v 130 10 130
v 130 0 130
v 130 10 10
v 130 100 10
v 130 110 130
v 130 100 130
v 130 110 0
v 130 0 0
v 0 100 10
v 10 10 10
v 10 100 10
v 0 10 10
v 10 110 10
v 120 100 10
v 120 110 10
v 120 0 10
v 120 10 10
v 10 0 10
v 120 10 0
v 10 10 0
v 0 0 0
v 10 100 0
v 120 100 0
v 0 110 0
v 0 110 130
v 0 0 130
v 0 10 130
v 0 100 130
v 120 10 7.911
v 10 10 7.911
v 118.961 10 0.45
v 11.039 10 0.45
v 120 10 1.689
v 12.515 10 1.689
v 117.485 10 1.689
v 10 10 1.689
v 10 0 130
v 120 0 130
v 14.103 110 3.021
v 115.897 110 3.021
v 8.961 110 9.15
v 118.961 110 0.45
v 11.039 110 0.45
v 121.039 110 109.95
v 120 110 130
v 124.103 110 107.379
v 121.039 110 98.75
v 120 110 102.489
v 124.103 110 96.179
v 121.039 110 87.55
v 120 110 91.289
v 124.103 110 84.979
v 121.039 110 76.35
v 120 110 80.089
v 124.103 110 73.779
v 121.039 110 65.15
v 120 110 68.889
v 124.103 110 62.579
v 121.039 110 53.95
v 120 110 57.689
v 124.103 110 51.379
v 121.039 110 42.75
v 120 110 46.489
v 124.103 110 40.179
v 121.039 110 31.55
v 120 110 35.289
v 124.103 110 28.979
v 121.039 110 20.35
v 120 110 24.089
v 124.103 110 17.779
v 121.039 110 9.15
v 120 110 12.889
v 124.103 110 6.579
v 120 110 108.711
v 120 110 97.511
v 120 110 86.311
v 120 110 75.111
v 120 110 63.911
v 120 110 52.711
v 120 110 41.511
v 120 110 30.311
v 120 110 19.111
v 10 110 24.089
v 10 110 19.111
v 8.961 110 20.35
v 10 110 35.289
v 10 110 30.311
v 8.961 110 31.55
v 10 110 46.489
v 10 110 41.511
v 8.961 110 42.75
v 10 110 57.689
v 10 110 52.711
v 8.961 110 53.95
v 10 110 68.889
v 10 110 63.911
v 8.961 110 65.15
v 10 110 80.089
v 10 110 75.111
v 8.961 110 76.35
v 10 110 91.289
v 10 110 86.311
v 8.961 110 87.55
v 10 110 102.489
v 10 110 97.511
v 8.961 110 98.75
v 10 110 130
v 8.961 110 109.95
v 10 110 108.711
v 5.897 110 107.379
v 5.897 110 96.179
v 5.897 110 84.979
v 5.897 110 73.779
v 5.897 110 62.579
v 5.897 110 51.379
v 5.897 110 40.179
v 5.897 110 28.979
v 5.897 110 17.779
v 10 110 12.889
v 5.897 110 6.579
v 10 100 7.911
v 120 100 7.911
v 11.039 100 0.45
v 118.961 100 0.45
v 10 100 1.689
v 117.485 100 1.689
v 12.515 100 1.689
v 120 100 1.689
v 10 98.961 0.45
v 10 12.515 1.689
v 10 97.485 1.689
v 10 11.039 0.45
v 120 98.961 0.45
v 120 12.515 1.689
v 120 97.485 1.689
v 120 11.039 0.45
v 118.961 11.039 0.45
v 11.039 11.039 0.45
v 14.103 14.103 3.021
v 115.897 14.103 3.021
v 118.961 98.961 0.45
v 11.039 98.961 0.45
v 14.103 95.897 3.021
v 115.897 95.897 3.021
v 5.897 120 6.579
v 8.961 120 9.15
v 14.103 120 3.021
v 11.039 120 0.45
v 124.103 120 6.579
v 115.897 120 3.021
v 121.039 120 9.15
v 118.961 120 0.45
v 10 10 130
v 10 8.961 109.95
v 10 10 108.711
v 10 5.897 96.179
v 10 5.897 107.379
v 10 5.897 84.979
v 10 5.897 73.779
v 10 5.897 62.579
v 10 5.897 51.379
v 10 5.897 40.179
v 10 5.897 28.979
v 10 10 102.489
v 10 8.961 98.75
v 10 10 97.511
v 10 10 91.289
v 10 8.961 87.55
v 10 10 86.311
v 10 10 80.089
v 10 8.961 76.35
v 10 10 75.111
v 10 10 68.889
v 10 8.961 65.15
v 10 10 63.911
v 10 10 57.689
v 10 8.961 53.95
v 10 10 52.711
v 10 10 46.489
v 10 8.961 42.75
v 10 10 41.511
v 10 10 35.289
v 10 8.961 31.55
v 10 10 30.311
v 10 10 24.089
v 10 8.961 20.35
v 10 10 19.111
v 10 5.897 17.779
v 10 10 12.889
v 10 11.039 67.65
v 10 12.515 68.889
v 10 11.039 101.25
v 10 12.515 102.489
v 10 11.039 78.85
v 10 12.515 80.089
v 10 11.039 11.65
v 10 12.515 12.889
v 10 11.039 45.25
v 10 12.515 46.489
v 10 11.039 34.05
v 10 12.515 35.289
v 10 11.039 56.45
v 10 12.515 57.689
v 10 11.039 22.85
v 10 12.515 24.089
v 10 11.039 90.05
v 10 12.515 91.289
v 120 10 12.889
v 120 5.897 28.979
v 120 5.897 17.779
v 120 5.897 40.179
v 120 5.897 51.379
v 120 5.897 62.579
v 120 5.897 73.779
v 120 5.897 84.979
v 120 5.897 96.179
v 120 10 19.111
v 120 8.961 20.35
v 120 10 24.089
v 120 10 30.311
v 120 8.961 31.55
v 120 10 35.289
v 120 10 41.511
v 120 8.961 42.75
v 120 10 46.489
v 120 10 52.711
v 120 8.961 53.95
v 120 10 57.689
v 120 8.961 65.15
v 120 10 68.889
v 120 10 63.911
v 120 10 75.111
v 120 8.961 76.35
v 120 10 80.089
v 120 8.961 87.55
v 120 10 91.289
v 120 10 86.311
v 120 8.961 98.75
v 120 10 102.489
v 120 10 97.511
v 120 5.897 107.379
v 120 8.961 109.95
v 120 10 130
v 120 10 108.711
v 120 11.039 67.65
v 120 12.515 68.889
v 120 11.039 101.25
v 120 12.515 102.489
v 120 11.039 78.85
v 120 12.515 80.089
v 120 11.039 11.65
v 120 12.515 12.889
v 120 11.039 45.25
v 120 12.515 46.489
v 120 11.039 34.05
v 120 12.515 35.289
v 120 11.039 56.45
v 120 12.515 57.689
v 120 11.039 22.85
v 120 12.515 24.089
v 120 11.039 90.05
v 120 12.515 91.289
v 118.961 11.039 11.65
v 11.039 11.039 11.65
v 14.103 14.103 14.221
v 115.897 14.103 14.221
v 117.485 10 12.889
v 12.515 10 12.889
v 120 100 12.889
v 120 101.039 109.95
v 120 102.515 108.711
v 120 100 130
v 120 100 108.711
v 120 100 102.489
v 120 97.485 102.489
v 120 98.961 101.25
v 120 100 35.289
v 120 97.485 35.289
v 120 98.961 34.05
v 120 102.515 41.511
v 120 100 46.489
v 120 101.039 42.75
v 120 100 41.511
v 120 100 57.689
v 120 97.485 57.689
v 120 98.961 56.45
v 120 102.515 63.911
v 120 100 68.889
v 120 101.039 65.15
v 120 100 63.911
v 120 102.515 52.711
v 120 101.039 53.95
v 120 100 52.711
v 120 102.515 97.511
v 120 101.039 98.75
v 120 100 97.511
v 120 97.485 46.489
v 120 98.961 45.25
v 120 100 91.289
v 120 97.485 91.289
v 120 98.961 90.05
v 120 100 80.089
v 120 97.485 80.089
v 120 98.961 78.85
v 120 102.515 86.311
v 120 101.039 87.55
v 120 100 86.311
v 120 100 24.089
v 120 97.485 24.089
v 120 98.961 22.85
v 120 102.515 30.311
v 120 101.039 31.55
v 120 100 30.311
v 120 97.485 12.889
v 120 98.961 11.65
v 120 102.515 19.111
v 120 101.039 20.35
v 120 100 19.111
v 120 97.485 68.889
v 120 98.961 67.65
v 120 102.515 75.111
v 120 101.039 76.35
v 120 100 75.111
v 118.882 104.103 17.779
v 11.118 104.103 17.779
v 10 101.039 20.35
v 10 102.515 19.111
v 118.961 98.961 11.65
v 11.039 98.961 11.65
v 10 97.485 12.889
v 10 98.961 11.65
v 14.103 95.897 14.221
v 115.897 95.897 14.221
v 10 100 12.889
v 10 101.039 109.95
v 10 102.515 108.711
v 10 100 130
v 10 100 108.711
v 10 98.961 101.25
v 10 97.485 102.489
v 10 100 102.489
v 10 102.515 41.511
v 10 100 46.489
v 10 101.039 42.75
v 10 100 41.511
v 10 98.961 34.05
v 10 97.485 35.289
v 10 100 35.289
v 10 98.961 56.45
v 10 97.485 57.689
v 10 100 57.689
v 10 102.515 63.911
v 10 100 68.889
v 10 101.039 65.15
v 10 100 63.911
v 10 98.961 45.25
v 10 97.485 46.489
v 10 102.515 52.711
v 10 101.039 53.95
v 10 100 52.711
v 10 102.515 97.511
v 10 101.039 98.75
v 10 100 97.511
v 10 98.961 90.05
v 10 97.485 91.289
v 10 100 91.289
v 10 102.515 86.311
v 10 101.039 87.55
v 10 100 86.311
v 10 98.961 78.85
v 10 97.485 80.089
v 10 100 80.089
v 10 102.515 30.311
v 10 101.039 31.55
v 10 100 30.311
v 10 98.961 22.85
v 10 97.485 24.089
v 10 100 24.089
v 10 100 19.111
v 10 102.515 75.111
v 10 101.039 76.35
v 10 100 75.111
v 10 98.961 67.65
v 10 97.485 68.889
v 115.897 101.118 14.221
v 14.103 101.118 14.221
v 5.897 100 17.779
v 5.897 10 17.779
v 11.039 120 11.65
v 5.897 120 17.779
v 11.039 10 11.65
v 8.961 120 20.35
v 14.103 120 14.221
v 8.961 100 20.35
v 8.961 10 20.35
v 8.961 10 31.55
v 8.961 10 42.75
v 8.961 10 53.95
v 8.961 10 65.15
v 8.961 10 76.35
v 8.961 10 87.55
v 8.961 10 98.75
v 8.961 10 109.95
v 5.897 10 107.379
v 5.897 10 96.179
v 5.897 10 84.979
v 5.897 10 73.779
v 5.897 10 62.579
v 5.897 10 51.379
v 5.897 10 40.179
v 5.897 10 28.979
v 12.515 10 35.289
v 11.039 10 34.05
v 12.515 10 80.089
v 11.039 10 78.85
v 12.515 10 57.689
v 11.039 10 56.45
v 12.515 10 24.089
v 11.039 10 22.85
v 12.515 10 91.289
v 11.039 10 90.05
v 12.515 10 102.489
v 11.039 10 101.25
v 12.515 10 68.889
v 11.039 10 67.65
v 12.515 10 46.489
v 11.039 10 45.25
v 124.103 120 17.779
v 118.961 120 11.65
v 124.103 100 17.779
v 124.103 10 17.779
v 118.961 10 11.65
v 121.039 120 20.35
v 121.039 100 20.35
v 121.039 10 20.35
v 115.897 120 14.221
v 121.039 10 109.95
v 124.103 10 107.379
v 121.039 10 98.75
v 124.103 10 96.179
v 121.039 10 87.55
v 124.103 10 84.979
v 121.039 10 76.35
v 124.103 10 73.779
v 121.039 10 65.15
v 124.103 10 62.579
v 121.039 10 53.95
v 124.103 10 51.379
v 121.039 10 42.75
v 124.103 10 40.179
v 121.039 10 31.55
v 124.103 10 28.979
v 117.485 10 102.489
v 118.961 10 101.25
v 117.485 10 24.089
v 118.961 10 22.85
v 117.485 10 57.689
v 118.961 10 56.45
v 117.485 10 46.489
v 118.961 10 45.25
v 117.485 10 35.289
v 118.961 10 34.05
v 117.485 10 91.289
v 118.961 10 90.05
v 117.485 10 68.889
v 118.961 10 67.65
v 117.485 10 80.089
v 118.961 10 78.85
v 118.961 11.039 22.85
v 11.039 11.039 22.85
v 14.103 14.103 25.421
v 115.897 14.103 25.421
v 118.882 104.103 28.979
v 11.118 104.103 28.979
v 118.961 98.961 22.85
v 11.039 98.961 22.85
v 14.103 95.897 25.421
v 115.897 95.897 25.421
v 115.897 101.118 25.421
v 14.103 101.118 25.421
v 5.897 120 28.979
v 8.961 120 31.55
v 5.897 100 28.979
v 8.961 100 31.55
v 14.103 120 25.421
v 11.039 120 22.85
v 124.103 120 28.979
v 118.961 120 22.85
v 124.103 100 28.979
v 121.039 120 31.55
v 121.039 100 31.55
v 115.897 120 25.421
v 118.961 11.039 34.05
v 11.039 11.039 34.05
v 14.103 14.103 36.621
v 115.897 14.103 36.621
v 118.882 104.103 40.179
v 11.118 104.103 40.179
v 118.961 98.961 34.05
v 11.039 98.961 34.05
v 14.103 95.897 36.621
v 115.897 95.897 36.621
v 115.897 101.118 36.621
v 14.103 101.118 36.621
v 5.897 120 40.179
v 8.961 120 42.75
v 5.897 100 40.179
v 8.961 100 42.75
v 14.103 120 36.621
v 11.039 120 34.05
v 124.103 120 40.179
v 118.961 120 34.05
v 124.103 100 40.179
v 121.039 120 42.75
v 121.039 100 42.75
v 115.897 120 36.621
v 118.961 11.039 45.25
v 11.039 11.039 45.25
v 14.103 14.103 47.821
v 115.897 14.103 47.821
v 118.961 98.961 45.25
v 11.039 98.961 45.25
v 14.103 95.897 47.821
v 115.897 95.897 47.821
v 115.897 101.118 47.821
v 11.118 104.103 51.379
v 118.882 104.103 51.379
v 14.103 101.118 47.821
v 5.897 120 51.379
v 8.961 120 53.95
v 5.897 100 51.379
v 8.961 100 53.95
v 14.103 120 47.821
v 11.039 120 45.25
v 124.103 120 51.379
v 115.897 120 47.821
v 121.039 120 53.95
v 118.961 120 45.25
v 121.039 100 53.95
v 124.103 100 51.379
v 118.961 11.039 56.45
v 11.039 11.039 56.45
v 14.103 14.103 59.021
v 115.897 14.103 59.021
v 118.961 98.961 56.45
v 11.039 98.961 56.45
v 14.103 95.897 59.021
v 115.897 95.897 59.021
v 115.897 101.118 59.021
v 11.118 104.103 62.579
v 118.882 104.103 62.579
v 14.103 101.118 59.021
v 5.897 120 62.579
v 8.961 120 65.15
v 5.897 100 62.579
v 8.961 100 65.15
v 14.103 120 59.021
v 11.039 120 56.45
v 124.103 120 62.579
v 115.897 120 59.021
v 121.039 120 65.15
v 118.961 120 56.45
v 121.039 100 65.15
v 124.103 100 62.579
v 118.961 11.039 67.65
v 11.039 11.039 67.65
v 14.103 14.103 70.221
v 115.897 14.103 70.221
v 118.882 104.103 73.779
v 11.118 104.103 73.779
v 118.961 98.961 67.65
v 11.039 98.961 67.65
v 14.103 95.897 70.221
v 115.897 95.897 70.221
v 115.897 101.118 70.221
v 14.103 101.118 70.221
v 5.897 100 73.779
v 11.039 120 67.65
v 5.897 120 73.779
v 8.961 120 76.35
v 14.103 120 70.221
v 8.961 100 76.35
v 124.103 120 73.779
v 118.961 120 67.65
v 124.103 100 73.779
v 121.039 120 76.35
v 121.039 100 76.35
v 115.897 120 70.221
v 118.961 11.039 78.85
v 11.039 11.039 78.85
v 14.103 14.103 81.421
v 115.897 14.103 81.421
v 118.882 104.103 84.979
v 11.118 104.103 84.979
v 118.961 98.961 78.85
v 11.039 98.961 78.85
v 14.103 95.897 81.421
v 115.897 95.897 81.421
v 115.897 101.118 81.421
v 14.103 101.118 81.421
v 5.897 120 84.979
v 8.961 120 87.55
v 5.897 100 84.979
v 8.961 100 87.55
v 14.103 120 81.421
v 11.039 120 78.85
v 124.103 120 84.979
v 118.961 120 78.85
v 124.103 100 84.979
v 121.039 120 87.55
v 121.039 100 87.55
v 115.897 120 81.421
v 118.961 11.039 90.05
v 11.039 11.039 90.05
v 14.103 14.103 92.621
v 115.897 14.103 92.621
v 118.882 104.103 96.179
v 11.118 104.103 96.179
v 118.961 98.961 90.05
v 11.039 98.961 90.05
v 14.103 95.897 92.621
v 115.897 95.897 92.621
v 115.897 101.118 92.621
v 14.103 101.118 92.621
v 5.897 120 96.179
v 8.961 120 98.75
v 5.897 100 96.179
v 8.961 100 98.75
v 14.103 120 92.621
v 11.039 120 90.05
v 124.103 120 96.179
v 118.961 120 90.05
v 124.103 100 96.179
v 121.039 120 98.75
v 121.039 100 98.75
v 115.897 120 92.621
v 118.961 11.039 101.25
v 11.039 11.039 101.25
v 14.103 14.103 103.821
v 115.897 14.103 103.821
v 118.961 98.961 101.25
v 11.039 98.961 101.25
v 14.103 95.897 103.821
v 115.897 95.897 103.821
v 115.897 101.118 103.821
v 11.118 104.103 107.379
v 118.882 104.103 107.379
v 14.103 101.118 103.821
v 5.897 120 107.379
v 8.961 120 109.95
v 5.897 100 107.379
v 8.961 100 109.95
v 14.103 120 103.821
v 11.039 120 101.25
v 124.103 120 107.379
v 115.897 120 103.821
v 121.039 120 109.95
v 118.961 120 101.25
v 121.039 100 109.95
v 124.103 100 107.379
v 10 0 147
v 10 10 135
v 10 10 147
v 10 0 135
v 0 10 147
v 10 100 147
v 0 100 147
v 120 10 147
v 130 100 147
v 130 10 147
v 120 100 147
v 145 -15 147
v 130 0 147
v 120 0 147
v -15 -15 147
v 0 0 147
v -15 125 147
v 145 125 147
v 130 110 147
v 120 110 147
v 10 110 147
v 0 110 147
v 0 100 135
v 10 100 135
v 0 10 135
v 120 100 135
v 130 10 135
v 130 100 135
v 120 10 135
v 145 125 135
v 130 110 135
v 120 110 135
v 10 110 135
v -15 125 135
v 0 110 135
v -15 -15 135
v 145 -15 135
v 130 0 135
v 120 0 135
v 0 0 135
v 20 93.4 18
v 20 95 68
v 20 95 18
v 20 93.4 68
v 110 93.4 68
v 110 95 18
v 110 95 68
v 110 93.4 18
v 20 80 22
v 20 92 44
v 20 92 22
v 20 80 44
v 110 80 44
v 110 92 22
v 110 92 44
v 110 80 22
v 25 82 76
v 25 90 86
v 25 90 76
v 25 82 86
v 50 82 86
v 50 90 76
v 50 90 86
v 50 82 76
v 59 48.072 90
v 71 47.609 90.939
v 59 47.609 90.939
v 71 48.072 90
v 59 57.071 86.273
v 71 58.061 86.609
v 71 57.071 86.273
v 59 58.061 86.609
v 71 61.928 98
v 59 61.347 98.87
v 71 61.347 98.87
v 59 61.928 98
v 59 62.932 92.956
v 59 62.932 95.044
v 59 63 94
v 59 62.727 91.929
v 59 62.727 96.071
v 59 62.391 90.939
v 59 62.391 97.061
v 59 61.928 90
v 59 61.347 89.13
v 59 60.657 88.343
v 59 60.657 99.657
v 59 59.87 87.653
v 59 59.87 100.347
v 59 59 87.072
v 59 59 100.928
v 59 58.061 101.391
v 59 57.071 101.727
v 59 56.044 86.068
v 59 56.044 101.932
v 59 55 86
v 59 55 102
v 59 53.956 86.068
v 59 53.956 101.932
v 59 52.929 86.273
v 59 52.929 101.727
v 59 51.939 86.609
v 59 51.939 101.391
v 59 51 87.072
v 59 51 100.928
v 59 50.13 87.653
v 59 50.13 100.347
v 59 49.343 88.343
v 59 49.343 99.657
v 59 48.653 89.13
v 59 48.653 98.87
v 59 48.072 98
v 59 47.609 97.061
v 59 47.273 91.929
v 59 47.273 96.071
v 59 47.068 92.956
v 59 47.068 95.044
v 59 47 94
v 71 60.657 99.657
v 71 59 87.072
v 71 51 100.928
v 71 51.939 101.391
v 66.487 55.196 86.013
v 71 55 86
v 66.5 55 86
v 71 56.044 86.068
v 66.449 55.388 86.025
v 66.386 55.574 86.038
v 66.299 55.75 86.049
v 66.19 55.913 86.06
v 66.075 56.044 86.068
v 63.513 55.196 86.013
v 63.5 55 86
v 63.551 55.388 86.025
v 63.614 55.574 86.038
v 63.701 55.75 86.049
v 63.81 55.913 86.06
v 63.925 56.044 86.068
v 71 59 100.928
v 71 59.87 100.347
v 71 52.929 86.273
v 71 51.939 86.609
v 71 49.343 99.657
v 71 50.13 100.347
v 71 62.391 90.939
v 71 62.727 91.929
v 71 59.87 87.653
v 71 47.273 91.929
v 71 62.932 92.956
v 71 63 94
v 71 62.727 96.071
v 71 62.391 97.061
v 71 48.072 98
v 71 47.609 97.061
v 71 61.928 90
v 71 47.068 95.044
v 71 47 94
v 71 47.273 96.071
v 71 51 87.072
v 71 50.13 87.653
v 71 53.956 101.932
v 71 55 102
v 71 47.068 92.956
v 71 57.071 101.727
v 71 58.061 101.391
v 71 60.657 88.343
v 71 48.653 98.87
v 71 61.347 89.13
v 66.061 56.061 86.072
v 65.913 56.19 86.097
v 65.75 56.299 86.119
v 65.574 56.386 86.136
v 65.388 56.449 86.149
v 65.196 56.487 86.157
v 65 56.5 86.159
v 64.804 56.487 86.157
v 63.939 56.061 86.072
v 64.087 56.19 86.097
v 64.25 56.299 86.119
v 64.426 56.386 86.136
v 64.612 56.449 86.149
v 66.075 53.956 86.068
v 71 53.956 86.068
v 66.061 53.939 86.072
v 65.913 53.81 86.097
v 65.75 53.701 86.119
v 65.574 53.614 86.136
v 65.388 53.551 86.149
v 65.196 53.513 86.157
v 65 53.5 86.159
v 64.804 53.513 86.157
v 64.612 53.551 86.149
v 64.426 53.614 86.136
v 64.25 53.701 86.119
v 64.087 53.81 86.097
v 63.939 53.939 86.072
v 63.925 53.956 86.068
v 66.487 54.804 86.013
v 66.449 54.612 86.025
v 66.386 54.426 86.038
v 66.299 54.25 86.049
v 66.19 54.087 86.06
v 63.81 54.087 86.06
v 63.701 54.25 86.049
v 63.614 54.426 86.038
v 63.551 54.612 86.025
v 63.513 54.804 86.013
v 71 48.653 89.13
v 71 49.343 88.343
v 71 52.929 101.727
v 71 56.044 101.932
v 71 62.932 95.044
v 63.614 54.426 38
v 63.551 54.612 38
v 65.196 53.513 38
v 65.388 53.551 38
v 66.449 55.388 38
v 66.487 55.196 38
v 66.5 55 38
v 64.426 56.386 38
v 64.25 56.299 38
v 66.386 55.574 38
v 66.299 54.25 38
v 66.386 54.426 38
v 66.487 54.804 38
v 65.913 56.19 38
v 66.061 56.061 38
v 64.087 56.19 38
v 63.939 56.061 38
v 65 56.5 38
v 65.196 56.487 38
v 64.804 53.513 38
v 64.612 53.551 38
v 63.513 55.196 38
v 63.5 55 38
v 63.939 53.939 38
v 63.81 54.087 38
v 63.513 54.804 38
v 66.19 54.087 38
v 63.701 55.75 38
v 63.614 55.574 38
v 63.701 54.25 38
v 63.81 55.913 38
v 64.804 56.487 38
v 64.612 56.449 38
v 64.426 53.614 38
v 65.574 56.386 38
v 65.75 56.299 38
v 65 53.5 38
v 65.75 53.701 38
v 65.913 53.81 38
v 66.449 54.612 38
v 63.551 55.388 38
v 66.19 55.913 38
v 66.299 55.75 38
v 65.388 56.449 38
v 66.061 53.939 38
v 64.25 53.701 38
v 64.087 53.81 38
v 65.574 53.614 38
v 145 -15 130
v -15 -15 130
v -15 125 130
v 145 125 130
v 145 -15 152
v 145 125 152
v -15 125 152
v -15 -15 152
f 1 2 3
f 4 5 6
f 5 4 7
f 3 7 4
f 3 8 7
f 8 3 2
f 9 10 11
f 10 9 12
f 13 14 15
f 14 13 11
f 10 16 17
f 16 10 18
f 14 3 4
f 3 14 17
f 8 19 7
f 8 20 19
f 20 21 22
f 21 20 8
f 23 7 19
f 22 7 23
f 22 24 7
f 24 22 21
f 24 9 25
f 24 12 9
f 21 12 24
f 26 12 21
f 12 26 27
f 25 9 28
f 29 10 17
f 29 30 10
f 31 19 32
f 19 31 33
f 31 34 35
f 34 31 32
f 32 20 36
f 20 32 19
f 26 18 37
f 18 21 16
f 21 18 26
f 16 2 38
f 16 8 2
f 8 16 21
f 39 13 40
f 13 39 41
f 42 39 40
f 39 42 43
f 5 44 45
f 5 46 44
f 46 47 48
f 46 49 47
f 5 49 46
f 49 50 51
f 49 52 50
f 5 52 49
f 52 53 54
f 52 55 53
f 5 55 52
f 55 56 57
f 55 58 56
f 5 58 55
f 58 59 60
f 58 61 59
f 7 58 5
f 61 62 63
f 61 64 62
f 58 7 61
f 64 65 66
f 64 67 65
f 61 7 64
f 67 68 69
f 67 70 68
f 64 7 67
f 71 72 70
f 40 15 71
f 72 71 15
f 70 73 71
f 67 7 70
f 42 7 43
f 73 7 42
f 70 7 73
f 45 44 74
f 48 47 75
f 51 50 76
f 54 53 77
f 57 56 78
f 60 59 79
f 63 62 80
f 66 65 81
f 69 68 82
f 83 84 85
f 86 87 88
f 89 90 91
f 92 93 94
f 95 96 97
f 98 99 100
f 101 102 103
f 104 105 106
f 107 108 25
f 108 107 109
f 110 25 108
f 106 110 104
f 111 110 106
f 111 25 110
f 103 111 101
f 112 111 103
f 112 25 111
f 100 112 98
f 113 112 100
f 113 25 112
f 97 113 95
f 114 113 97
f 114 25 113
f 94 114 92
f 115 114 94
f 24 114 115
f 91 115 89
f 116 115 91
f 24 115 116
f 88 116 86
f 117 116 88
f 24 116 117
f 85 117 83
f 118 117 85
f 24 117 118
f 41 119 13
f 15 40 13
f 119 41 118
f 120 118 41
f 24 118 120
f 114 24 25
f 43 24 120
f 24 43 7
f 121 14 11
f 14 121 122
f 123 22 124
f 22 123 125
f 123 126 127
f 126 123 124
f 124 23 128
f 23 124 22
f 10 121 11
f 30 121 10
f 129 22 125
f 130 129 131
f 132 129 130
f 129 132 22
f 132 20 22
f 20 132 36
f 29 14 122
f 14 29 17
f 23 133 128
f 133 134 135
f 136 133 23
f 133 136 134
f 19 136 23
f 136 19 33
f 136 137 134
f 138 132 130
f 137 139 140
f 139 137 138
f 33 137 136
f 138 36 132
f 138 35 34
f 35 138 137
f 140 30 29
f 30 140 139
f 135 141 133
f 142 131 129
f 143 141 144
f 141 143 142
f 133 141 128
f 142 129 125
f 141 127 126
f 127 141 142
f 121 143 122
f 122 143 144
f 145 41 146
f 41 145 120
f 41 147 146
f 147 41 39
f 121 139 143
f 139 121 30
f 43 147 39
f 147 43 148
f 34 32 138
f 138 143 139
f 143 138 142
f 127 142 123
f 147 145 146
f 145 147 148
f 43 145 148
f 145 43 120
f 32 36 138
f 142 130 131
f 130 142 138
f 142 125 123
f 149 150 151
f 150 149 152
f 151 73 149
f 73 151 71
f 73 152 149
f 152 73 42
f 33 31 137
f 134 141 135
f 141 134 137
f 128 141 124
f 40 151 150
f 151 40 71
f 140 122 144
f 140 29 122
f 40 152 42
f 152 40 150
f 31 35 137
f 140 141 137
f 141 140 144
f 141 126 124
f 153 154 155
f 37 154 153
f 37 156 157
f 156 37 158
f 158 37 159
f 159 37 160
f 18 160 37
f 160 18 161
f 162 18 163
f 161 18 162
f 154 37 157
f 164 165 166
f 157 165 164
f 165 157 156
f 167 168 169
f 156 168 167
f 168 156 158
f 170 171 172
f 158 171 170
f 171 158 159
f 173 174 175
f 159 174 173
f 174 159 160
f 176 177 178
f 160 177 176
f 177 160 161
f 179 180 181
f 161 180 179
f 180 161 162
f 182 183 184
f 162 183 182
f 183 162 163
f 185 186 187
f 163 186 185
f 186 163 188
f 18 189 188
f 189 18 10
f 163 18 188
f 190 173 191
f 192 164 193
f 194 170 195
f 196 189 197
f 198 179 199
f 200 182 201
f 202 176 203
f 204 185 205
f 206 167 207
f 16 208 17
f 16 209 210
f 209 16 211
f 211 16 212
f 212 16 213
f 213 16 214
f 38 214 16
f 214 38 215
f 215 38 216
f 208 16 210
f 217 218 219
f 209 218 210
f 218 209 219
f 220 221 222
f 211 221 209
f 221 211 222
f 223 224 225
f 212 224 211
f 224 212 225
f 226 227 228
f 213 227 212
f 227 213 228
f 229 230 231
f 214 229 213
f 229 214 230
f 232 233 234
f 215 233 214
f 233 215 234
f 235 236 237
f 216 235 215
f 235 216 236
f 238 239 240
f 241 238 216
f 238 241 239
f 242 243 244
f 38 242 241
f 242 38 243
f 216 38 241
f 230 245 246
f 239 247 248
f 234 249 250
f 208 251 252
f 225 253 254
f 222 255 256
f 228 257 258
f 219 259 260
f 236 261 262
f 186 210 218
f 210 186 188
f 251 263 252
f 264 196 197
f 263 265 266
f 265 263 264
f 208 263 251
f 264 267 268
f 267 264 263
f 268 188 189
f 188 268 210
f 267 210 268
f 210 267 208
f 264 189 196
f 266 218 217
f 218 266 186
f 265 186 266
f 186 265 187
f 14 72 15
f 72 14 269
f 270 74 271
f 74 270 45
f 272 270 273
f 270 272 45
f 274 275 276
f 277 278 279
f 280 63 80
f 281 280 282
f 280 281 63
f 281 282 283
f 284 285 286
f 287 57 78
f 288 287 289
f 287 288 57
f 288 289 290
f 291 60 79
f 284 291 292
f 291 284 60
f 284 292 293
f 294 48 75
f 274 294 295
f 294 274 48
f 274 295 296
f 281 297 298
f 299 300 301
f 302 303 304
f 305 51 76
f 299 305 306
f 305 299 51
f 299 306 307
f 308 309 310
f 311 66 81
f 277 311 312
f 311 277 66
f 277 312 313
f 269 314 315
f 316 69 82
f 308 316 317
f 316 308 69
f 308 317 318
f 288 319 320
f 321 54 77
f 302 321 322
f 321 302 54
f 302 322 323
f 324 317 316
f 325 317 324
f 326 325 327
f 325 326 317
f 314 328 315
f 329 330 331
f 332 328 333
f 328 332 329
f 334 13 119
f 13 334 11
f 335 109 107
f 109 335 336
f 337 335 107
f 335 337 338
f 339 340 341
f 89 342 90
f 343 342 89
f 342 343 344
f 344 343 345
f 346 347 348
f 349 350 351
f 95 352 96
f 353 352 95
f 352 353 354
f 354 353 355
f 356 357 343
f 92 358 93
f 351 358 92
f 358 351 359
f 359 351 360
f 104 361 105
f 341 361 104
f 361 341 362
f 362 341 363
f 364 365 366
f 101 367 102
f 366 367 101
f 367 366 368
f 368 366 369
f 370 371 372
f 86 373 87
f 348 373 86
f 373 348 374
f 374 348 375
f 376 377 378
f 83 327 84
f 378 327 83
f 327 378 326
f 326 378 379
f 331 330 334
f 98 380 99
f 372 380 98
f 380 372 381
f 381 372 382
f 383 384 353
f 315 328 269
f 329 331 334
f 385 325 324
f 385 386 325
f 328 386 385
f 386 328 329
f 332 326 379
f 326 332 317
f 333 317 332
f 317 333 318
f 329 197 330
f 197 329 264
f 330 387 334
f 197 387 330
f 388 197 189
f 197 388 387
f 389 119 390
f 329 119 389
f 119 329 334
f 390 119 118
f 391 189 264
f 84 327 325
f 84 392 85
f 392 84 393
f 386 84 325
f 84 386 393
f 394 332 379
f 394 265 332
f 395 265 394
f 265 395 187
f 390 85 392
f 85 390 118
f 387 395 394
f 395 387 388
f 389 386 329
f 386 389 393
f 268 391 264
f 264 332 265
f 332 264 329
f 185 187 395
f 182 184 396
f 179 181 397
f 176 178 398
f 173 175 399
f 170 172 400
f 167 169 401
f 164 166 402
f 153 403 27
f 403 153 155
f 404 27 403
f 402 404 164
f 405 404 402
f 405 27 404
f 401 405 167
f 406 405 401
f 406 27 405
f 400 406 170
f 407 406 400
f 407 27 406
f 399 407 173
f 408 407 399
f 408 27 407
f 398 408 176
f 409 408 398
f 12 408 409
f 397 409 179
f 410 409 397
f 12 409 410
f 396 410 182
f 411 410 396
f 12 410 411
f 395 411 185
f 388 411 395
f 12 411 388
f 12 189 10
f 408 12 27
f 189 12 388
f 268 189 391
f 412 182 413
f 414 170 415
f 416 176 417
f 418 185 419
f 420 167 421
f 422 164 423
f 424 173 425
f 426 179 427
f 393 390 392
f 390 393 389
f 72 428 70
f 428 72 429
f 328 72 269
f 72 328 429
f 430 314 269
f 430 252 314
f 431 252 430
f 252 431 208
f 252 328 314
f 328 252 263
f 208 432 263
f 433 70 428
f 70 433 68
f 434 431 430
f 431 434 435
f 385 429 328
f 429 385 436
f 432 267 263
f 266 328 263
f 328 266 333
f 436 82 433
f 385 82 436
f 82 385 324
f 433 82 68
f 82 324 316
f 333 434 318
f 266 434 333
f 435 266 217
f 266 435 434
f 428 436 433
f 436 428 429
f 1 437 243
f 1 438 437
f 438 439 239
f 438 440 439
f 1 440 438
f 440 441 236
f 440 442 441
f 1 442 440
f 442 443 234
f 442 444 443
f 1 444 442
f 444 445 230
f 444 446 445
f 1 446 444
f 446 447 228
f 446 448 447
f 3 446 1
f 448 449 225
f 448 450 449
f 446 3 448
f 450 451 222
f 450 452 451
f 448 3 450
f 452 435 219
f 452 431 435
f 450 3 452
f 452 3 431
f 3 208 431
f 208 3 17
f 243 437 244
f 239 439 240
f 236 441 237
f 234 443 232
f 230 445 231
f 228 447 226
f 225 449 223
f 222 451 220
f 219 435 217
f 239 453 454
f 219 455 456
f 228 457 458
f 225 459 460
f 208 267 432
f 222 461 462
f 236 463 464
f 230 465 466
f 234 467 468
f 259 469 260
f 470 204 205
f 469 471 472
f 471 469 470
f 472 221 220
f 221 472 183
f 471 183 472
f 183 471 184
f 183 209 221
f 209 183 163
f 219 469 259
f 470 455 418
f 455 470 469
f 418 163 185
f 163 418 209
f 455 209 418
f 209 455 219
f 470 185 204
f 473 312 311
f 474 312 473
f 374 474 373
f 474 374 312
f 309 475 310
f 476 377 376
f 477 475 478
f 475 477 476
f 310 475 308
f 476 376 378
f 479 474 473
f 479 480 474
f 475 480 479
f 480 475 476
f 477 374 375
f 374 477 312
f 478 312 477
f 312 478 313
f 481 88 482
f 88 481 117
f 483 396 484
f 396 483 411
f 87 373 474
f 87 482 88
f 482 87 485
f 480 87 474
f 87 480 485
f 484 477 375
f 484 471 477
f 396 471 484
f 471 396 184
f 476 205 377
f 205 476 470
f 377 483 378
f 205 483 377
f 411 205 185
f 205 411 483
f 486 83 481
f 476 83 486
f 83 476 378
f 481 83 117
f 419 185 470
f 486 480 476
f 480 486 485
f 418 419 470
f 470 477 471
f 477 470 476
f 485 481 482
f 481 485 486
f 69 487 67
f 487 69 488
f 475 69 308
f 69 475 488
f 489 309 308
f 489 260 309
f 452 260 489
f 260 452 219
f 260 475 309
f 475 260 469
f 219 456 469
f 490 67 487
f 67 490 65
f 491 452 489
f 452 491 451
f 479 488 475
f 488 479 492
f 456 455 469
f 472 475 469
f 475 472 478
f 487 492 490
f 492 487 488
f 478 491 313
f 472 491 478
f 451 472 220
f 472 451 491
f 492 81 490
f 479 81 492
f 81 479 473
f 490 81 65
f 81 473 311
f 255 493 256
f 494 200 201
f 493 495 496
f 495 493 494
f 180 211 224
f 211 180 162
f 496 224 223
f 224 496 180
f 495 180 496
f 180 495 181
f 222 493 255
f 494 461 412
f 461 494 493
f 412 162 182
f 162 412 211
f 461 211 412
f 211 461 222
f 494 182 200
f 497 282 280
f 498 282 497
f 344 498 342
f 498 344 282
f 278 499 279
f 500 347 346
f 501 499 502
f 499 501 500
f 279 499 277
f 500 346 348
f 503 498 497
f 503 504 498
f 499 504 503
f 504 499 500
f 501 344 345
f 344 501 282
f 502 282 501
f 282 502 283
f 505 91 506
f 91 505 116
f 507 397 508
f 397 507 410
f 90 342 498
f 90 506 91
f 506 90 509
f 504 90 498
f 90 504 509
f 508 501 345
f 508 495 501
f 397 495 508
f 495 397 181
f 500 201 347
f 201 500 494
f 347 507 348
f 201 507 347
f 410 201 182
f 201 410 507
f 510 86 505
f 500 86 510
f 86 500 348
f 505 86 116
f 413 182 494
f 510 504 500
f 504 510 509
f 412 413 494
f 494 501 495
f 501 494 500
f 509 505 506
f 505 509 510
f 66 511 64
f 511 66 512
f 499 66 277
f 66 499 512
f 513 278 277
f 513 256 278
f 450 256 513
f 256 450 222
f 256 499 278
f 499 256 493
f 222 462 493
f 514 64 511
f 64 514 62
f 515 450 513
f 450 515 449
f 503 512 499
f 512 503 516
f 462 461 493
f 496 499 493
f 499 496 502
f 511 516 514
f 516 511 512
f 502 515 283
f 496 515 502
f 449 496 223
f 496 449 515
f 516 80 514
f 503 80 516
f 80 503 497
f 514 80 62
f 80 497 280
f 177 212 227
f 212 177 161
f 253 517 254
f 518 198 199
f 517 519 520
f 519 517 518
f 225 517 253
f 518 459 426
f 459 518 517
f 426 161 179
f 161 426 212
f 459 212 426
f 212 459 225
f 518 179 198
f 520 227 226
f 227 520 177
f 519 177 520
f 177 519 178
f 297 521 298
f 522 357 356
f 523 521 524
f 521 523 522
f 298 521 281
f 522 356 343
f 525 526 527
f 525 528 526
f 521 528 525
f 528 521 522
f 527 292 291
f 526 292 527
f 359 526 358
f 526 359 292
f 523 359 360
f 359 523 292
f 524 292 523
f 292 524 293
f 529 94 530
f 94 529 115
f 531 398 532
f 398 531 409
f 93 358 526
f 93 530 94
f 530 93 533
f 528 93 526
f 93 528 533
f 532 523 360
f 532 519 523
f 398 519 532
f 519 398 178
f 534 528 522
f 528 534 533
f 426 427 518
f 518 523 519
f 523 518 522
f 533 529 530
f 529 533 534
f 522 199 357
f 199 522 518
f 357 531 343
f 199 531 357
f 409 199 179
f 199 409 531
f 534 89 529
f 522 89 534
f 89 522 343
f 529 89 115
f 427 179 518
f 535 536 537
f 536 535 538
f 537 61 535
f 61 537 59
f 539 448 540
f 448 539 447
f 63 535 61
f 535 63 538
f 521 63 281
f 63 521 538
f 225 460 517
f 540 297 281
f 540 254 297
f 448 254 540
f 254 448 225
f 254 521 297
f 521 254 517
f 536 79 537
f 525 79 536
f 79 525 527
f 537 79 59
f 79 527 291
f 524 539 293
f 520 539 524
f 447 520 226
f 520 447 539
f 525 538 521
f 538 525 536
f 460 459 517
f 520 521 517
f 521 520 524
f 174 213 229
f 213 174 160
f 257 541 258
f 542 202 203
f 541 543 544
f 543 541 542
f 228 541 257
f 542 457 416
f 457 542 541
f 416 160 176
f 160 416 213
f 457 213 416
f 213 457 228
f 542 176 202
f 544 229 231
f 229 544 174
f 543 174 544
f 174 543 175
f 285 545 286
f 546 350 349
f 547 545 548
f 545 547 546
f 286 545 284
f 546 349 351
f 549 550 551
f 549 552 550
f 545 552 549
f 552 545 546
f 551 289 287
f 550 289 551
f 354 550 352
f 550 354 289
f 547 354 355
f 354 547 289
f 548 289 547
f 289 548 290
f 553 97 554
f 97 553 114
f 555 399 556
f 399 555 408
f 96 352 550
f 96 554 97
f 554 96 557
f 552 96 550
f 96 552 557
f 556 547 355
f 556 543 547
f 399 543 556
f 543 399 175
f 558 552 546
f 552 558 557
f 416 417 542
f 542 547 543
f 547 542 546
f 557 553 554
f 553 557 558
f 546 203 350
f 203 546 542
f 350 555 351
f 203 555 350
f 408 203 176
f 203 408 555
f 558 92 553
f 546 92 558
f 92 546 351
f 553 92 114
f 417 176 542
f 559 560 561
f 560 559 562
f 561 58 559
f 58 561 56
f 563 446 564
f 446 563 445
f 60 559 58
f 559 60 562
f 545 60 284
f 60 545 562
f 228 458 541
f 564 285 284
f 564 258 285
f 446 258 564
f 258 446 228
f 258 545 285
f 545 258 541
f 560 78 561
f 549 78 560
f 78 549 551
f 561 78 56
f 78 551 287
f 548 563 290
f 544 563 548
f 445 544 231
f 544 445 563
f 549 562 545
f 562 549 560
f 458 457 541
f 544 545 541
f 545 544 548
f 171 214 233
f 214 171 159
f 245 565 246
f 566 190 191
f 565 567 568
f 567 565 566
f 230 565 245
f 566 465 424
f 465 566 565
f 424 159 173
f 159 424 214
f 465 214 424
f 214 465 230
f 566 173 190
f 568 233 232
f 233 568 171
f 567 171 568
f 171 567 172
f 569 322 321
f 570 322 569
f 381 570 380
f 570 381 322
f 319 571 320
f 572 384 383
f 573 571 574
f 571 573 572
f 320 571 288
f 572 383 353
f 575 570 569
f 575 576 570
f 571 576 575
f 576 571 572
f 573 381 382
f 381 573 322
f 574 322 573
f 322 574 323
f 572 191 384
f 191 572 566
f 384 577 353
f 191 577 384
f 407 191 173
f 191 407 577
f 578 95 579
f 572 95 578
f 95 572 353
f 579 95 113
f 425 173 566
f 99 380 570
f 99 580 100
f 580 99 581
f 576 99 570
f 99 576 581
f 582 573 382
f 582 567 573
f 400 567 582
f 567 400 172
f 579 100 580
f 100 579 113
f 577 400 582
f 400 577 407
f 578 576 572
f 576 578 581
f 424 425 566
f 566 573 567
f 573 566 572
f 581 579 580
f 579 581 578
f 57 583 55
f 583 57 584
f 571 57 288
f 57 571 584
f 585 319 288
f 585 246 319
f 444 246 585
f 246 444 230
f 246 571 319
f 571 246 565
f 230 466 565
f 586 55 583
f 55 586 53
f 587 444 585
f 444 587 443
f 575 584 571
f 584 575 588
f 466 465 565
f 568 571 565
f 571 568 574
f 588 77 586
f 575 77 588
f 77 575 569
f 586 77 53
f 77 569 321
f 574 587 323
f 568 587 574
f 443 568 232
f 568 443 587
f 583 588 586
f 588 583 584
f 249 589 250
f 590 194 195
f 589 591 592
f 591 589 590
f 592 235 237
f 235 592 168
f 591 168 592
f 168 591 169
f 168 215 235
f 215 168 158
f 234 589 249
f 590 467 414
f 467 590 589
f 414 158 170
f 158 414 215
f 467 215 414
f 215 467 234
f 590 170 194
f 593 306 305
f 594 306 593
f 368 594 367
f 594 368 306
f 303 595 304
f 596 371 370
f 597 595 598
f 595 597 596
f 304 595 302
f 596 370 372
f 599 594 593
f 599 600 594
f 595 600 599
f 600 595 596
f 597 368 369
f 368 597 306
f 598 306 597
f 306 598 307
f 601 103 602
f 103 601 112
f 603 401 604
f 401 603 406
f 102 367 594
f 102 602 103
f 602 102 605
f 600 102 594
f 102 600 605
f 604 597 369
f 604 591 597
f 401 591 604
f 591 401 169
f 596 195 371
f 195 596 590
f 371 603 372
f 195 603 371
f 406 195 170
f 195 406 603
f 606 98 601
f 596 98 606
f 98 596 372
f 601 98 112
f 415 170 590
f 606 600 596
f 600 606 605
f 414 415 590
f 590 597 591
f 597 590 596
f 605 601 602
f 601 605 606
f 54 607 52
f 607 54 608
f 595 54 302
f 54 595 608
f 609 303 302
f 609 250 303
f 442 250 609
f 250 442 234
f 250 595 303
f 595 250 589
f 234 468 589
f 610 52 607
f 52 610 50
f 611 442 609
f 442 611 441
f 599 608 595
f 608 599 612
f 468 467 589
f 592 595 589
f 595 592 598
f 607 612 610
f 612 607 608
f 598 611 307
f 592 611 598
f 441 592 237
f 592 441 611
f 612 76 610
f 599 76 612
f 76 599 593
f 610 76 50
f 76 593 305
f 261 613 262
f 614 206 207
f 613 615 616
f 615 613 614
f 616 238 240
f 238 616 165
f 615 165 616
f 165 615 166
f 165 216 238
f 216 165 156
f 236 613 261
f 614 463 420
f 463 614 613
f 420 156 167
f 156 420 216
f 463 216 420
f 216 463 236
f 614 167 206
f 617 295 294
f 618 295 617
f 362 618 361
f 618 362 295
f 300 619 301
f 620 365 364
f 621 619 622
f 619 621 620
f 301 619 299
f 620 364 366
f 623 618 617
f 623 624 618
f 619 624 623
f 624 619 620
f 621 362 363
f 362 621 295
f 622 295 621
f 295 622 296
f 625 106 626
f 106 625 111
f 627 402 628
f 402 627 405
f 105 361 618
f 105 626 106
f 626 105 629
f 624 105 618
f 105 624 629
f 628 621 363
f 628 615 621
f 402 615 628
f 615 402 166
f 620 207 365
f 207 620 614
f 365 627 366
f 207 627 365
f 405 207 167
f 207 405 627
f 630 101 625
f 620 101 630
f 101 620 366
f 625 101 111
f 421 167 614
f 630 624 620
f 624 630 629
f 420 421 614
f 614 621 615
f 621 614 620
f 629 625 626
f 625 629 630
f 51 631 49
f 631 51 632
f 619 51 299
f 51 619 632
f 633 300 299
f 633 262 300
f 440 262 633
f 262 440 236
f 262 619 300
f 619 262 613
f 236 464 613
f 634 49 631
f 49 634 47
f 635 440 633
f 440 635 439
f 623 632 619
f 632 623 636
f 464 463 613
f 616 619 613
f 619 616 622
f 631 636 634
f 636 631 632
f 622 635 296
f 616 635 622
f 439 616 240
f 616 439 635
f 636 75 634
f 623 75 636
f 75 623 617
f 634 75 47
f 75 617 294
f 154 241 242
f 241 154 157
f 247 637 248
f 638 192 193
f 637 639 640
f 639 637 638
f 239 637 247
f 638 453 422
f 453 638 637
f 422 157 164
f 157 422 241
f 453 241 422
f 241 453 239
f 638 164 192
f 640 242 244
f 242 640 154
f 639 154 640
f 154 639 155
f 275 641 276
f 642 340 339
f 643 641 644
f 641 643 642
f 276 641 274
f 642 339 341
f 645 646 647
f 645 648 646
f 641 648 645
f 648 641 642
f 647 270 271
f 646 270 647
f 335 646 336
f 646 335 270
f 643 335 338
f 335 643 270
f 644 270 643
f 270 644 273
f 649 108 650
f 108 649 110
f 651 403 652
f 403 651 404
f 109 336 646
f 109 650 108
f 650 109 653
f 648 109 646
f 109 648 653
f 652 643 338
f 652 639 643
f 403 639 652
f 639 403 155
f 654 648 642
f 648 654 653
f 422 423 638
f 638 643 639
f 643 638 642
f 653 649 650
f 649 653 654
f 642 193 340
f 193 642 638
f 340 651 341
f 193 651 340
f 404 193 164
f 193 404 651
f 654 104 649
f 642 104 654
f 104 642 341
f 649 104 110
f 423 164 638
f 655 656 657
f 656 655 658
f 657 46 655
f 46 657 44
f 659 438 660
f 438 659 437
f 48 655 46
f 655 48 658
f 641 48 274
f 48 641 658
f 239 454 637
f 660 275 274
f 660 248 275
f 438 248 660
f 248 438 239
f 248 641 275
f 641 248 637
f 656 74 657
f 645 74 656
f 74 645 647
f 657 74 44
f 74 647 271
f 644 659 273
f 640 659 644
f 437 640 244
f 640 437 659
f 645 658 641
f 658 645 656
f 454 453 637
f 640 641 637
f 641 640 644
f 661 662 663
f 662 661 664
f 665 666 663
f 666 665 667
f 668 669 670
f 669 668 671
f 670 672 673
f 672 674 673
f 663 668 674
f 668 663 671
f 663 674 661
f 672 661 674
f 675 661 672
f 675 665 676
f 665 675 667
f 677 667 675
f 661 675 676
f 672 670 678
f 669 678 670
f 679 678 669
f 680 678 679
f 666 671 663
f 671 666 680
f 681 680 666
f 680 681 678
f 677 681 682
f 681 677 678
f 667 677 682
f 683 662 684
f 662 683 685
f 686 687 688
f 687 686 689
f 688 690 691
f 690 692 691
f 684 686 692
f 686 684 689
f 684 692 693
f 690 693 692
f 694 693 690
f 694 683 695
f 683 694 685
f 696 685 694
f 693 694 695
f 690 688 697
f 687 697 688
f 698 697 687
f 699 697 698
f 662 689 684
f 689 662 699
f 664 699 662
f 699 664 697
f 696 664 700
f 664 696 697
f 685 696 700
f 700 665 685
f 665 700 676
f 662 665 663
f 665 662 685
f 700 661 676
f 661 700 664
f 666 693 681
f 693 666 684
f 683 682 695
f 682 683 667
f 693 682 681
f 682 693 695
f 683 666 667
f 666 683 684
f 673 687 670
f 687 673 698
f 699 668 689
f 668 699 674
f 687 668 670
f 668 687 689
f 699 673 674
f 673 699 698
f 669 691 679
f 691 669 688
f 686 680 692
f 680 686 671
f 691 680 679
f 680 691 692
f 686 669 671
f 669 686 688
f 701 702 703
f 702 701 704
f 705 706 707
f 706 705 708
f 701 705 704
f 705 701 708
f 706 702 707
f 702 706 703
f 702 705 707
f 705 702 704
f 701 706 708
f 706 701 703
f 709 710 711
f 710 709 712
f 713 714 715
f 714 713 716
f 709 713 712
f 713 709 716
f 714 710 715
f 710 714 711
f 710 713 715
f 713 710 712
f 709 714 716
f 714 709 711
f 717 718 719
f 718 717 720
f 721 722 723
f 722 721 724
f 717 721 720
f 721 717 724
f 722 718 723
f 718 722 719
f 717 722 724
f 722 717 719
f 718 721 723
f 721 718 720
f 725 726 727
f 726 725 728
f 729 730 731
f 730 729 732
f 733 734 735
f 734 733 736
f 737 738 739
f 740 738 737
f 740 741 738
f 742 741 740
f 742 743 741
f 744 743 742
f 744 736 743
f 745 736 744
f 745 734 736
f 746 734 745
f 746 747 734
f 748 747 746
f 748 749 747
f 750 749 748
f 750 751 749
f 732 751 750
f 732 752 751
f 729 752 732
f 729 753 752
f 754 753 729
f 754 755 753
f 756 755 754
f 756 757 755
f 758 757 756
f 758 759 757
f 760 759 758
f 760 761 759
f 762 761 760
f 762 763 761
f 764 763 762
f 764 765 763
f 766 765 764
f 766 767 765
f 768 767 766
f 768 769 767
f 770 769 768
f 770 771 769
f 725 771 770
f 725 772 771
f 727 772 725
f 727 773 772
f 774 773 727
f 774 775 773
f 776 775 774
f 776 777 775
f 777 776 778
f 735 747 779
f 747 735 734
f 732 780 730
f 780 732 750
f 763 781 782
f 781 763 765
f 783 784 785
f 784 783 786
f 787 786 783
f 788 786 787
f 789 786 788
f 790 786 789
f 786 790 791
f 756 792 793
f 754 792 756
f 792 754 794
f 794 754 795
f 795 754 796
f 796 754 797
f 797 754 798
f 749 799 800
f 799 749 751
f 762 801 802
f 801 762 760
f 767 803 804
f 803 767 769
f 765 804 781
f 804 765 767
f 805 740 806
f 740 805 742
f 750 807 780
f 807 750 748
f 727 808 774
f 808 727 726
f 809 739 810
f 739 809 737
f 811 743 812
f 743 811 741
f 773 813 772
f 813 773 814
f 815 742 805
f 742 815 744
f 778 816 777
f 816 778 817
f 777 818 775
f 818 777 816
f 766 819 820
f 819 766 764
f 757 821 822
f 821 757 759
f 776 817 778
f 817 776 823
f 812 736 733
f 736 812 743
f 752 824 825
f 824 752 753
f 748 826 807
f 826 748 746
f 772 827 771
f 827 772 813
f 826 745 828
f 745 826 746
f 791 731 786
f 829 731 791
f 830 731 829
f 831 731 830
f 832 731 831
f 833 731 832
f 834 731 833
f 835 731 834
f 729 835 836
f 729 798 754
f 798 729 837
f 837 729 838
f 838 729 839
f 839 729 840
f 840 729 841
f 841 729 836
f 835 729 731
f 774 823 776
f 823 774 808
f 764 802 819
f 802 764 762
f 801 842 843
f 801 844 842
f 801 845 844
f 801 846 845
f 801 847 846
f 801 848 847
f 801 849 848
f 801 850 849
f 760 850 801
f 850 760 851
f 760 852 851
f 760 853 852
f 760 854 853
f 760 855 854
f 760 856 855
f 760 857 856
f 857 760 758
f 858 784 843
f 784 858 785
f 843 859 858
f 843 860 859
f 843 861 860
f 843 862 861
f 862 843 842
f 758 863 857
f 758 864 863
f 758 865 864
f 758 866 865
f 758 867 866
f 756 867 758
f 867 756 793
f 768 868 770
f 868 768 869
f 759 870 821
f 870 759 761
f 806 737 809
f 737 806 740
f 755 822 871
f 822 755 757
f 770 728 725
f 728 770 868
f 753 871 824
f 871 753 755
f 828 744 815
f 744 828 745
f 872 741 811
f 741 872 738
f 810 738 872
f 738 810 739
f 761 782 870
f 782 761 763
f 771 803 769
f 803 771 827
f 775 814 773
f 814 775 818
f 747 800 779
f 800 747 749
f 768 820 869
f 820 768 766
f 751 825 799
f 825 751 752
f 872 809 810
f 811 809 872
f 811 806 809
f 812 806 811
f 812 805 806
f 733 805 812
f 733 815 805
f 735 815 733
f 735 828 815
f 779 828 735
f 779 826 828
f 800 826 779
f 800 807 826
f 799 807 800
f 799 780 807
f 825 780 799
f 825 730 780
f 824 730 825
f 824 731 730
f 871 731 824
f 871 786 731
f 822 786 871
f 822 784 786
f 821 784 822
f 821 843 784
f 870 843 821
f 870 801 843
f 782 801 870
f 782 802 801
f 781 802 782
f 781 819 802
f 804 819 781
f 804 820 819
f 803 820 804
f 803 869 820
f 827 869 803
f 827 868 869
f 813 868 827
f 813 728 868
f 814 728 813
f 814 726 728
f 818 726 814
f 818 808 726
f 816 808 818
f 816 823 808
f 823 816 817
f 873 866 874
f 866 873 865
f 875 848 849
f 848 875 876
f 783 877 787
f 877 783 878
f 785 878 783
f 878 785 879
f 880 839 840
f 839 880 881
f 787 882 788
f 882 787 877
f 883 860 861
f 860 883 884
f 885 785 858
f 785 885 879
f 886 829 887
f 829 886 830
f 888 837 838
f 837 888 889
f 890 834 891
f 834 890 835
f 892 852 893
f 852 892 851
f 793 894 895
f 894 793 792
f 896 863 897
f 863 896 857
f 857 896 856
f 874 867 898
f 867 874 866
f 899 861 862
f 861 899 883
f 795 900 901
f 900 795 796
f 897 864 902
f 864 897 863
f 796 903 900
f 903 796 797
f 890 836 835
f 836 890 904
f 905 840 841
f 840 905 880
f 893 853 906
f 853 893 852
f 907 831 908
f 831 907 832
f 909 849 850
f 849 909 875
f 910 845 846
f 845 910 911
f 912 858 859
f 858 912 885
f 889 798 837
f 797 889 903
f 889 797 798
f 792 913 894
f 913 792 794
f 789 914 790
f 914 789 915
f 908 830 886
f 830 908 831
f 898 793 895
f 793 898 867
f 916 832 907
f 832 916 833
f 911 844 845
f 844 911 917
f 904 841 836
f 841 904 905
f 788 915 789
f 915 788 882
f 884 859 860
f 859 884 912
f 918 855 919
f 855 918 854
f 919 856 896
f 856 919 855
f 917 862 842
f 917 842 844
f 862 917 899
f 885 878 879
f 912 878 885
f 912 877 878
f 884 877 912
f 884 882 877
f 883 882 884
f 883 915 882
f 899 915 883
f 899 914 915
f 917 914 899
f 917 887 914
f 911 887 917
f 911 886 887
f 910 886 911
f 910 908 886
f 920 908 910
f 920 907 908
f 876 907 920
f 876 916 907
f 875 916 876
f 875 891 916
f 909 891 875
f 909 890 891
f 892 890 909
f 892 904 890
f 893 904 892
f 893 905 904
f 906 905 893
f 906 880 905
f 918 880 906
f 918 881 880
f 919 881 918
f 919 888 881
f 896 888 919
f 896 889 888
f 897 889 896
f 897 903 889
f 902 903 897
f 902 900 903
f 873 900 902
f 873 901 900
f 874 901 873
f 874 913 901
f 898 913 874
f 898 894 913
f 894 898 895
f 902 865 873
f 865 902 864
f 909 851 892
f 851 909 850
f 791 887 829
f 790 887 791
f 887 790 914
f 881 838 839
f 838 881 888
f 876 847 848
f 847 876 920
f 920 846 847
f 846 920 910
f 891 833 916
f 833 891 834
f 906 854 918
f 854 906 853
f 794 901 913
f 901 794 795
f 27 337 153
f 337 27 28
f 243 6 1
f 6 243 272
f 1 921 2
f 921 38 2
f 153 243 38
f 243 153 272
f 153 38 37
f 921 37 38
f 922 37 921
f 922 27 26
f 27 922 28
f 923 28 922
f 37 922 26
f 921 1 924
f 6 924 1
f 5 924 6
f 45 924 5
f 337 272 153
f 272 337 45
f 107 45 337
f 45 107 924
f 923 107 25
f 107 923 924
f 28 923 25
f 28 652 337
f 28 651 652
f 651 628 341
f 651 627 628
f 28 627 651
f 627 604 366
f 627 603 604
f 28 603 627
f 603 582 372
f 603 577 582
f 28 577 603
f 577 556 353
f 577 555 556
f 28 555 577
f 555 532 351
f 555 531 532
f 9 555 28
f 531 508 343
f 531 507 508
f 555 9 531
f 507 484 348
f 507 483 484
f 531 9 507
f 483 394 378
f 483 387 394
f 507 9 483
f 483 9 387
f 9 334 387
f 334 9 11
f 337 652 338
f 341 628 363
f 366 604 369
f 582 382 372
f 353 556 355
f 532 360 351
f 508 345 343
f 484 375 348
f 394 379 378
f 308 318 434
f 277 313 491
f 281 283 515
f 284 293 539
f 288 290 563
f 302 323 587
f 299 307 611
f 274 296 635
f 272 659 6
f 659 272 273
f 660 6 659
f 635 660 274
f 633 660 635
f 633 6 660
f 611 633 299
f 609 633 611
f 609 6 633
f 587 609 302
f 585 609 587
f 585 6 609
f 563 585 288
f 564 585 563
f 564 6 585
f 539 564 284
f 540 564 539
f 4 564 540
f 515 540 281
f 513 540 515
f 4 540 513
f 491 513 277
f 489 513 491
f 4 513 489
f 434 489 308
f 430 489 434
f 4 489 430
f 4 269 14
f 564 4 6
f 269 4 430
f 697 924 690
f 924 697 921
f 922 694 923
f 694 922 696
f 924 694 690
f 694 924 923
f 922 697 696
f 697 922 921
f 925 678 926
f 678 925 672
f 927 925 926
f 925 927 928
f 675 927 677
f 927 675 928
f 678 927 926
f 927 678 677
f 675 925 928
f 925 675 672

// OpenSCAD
//
// ============================================================================
// MeteoHubSensor - MINI ÉCRAN DE STEVENSON
// V8 - adaptation du plan Stevenson traditionnel fourni
// ============================================================================
//
// Référence de conception :
// le plan traditionnel montre des lames inclinées vers l'extérieur,
// superposées sur les quatre faces, avec une vraie circulation d'air.
// Cette version reprend CE principe, à l'échelle du MeteoHubSensor.
//
// DIMENSIONS
// ----------
// Volume intérieur : 110 x 90 x 110 mm
// Caisson extérieur : 130 x 110 x 130 mm
//
// LAMELLES
// --------
// 10 par face
// section : 110 x 8 x 4 mm
// inclinaison : 40° sous l'horizontale
// pas vertical : 11.2 mm
// ouverture verticale projetée : ~2.5 mm
//
// IMPORTANT :
// "extérieur plus bas" est garanti sur les quatre faces.
//
// AVANT  : extérieur = Y-  -> +40°
// ARRIÈRE: extérieur = Y+  -> -40°
// GAUCHE : extérieur = X-  -> -40°
// DROITE : extérieur = X+  -> +40°
//
// Le choix de 40° est volontairement proche du profil visible sur
// la coupe du plan traditionnel fourni.
// ============================================================================

$fn = 48;

// ---------------------------------------------------------------------------
// CAISSON
// ---------------------------------------------------------------------------

IW = 110;
ID = 90;
IH = 110;

POST = 10;
POST_H = 130;

// ---------------------------------------------------------------------------
// LAMELLES
// ---------------------------------------------------------------------------

SLAT_L     = 110;
SLAT_T     = 4;
SLAT_H     = 8;

SLAT_COUNT = 10;
SLAT_PITCH = 11.2;

// Centre de la première lame.
// Les 10 lames couvrent pratiquement toute la hauteur intérieure.
SLAT_Z0 = 4.8;

SLAT_ANGLE = 40;

// ---------------------------------------------------------------------------
// TOIT DOUBLE - inspiré du principe du plan traditionnel
// ---------------------------------------------------------------------------

ROOF_W   = 160;
ROOF_D   = 140;
ROOF_T   = 5;
ROOF_GAP = 12;

// ---------------------------------------------------------------------------
// ÉLECTRONIQUE V1
// ---------------------------------------------------------------------------

SHOW_ELECTRONICS = true;

BOARD_X = 90;
BOARD_Y = 50;
BOARD_T = 1.6;

BAT_X = 90;
BAT_Y = 22;
BAT_T = 12;

RECT_X = 25;
RECT_Y = 10;
RECT_T = 8;

// ---------------------------------------------------------------------------
// COULEURS
// ---------------------------------------------------------------------------

wood        = [0.72,0.50,0.28];
wood_slat   = [0.82,0.62,0.38];
electronics = [0.15,0.18,0.20];
battery_col = [0.25,0.25,0.25];
rectifier_col = [0.10,0.35,0.10];
sensor_col  = [0.75,0.75,0.75];


// ============================================================================
// MONTANTS
// ============================================================================

module post(x,y) {
    color(wood)
        translate([x,y,0])
            cube([POST,POST,POST_H]);
}


// ============================================================================
// LAMELLES
//
// Chaque lame est centrée sur z puis inclinée.
//
// Le bord extérieur est toujours plus bas :
//
//                 INTÉRIEUR
//                     ▲
//                     │
//             ───────────────
//                ╲
//                 ╲
//                  ╲
//             ───────────────
//                     │
//                     ▼
//                 EXTÉRIEUR
//
// Le vide entre deux lames est réel : l'air peut entrer/sortir.
// ============================================================================

// AVANT : extérieur Y-
module slat_front(z) {
    color(wood_slat)
        translate([POST, POST, z])
            rotate([+SLAT_ANGLE,0,0])
                translate([0,-SLAT_T/2,-SLAT_H/2])
                    cube([SLAT_L,SLAT_T,SLAT_H]);
}

// ARRIÈRE : extérieur Y+
module slat_back(z) {
    color(wood_slat)
        translate([POST, ID+POST, z])
            rotate([-SLAT_ANGLE,0,0])
                translate([0,-SLAT_T/2,-SLAT_H/2])
                    cube([SLAT_L,SLAT_T,SLAT_H]);
}

// GAUCHE : extérieur X-
module slat_left(z) {
    color(wood_slat)
        translate([POST,POST,z])
            rotate([0,-SLAT_ANGLE,0])
                translate([-SLAT_T/2,0,-SLAT_H/2])
                    cube([SLAT_T,SLAT_L,SLAT_H]);
}

// DROITE : extérieur X+
module slat_right(z) {
    color(wood_slat)
        translate([IW+POST,POST,z])
            rotate([0,+SLAT_ANGLE,0])
                translate([-SLAT_T/2,0,-SLAT_H/2])
                    cube([SLAT_T,SLAT_L,SLAT_H]);
}


// ============================================================================
// CADRE INFÉRIEUR
//
// Le plan traditionnel possède un plancher intermédiaire.
// Pour MeteoHubSensor, on ne ferme pas le dessous : la sonde doit rester
// ventilée et l'électronique ne doit pas créer une poche thermique.
// On conserve uniquement un cadre porteur.
// ============================================================================

module lower_frame() {
    color(wood);

    // traverse avant
    translate([0,0,0])
        cube([IW+2*POST,POST,POST]);

    // traverse arrière
    translate([0,ID+POST,0])
        cube([IW+2*POST,POST,POST]);

    // traverses latérales
    translate([0,POST,0])
        cube([POST,ID,POST]);

    translate([IW+POST,POST,0])
        cube([POST,ID,POST]);
}


// ============================================================================
// DOUBLE TOIT
// ============================================================================

module roof_plate(z) {
    color(wood)
        translate([
            (IW+2*POST-ROOF_W)/2,
            (ID+2*POST-ROOF_D)/2,
            z
        ])
            cube([ROOF_W,ROOF_D,ROOF_T]);
}

module roof_spacer(x,y,z) {
    color(wood)
        translate([x,y,z])
            cube([POST,POST,ROOF_GAP]);
}


// ============================================================================
// ÉLECTRONIQUE V1 - SIMPLE ENCOMBREMENT
// ============================================================================

module board_demo() {

    // Carte actuelle 90 x 50 mm
    color(electronics)
        translate([POST+10, POST+ID-5, 18])
            rotate([90,0,0])
                cube([BOARD_X,BOARD_Y,BOARD_T]);

    // Support batterie 90 x 22 mm
    color(battery_col)
        translate([POST+10, POST+ID-8, 22])
            rotate([90,0,0])
                cube([BAT_X,BAT_Y,BAT_T]);

    // Petit redresseur 25 x 10 mm
    color(rectifier_col)
        translate([POST+15, POST+ID-10, 76])
            rotate([90,0,0])
                cube([RECT_X,RECT_Y,RECT_T]);
}


// ============================================================================
// CAPTEUR DÉPORTÉ
// ============================================================================

module sensor_demo() {

    // Position haute et centrale
    color(sensor_col)
        translate([
            POST+IW/2,
            POST+ID/2,
            94
        ])
            rotate([0,90,0])
                cylinder(d=16,h=12,center=true);

    // Faisceau indicatif
    color([0.08,0.08,0.08])
        translate([
            POST+IW/2,
            POST+ID/2,
            38
        ])
            cylinder(d=3,h=56);
}


// ============================================================================
// ABRI COMPLET
// ============================================================================

module shelter() {

    // 4 montants
    post(0,0);
    post(IW+POST,0);
    post(0,ID+POST);
    post(IW+POST,ID+POST);

    // Cadre inférieur ouvert
    lower_frame();

    // Lamelles Stevenson : 10 rangées sur chacune des 4 faces
    for (i=[0:SLAT_COUNT-1]) {

        z = SLAT_Z0 + i*SLAT_PITCH;

        slat_front(z);
        slat_back(z);
        slat_left(z);
        slat_right(z);
    }

    // Toit double : 12 mm de lame d'air
    roof_plate(POST_H);

    for (x=[0,IW+POST])
        for (y=[0,ID+POST])
            roof_spacer(x,y,POST_H+ROOF_T);

    roof_plate(POST_H+ROOF_T+ROOF_GAP);

    if (SHOW_ELECTRONICS)
        board_demo();

    sensor_demo();
}

shelter();


// ============================================================================
// NOMENCLATURE - BOIS
// ============================================================================
//
// 4 x montants
//     130 x 10 x 10 mm
//
// 40 x lamelles
//     110 x 8 x 4 mm
//     10 par face
//
// 4 x traverses du cadre inférieur
//     dimensions adaptées aux montants
//
// 2 x plaques de toit
//     160 x 140 x 5 mm
//
// 4 x entretoises de toit
//     10 x 10 x 12 mm
//
// ============================================================================
// VÉRIFICATION DE LA GÉOMÉTRIE
// ============================================================================
//
// Une lame de 8 x 4 mm inclinée de 40° présente une hauteur projetée
// d'environ :
//
//     8*cos(40°) + 4*sin(40°) ≈ 8.70 mm
//
// Le pas est 11.20 mm.
//
// Donc l'ouverture verticale entre deux lames est d'environ :
//
//     11.20 - 8.70 ≈ 2.50 mm
//
// Il existe donc un passage d'air réel.
//
// La lame descend vers l'extérieur sur les quatre faces :
// l'eau ne peut pas être conduite vers l'intérieur par la pente.
//
// ============================================================================
// ADAPTATION DU PLAN TRADITIONNEL
// ============================================================================
//
// Conservé :
//   - lames inclinées et superposées sur les faces
//   - structure à quatre montants
//   - forte protection solaire
//   - double toit ventilé
//
// Adapté pour MeteoHubSensor :
//   - dimensions miniatures
//   - pas de portes : abri fixe
//   - pas de plancher plein : meilleure ventilation du capteur
//   - capteur déporté en partie haute
//   - électronique en partie basse
//
// ============================================================================
